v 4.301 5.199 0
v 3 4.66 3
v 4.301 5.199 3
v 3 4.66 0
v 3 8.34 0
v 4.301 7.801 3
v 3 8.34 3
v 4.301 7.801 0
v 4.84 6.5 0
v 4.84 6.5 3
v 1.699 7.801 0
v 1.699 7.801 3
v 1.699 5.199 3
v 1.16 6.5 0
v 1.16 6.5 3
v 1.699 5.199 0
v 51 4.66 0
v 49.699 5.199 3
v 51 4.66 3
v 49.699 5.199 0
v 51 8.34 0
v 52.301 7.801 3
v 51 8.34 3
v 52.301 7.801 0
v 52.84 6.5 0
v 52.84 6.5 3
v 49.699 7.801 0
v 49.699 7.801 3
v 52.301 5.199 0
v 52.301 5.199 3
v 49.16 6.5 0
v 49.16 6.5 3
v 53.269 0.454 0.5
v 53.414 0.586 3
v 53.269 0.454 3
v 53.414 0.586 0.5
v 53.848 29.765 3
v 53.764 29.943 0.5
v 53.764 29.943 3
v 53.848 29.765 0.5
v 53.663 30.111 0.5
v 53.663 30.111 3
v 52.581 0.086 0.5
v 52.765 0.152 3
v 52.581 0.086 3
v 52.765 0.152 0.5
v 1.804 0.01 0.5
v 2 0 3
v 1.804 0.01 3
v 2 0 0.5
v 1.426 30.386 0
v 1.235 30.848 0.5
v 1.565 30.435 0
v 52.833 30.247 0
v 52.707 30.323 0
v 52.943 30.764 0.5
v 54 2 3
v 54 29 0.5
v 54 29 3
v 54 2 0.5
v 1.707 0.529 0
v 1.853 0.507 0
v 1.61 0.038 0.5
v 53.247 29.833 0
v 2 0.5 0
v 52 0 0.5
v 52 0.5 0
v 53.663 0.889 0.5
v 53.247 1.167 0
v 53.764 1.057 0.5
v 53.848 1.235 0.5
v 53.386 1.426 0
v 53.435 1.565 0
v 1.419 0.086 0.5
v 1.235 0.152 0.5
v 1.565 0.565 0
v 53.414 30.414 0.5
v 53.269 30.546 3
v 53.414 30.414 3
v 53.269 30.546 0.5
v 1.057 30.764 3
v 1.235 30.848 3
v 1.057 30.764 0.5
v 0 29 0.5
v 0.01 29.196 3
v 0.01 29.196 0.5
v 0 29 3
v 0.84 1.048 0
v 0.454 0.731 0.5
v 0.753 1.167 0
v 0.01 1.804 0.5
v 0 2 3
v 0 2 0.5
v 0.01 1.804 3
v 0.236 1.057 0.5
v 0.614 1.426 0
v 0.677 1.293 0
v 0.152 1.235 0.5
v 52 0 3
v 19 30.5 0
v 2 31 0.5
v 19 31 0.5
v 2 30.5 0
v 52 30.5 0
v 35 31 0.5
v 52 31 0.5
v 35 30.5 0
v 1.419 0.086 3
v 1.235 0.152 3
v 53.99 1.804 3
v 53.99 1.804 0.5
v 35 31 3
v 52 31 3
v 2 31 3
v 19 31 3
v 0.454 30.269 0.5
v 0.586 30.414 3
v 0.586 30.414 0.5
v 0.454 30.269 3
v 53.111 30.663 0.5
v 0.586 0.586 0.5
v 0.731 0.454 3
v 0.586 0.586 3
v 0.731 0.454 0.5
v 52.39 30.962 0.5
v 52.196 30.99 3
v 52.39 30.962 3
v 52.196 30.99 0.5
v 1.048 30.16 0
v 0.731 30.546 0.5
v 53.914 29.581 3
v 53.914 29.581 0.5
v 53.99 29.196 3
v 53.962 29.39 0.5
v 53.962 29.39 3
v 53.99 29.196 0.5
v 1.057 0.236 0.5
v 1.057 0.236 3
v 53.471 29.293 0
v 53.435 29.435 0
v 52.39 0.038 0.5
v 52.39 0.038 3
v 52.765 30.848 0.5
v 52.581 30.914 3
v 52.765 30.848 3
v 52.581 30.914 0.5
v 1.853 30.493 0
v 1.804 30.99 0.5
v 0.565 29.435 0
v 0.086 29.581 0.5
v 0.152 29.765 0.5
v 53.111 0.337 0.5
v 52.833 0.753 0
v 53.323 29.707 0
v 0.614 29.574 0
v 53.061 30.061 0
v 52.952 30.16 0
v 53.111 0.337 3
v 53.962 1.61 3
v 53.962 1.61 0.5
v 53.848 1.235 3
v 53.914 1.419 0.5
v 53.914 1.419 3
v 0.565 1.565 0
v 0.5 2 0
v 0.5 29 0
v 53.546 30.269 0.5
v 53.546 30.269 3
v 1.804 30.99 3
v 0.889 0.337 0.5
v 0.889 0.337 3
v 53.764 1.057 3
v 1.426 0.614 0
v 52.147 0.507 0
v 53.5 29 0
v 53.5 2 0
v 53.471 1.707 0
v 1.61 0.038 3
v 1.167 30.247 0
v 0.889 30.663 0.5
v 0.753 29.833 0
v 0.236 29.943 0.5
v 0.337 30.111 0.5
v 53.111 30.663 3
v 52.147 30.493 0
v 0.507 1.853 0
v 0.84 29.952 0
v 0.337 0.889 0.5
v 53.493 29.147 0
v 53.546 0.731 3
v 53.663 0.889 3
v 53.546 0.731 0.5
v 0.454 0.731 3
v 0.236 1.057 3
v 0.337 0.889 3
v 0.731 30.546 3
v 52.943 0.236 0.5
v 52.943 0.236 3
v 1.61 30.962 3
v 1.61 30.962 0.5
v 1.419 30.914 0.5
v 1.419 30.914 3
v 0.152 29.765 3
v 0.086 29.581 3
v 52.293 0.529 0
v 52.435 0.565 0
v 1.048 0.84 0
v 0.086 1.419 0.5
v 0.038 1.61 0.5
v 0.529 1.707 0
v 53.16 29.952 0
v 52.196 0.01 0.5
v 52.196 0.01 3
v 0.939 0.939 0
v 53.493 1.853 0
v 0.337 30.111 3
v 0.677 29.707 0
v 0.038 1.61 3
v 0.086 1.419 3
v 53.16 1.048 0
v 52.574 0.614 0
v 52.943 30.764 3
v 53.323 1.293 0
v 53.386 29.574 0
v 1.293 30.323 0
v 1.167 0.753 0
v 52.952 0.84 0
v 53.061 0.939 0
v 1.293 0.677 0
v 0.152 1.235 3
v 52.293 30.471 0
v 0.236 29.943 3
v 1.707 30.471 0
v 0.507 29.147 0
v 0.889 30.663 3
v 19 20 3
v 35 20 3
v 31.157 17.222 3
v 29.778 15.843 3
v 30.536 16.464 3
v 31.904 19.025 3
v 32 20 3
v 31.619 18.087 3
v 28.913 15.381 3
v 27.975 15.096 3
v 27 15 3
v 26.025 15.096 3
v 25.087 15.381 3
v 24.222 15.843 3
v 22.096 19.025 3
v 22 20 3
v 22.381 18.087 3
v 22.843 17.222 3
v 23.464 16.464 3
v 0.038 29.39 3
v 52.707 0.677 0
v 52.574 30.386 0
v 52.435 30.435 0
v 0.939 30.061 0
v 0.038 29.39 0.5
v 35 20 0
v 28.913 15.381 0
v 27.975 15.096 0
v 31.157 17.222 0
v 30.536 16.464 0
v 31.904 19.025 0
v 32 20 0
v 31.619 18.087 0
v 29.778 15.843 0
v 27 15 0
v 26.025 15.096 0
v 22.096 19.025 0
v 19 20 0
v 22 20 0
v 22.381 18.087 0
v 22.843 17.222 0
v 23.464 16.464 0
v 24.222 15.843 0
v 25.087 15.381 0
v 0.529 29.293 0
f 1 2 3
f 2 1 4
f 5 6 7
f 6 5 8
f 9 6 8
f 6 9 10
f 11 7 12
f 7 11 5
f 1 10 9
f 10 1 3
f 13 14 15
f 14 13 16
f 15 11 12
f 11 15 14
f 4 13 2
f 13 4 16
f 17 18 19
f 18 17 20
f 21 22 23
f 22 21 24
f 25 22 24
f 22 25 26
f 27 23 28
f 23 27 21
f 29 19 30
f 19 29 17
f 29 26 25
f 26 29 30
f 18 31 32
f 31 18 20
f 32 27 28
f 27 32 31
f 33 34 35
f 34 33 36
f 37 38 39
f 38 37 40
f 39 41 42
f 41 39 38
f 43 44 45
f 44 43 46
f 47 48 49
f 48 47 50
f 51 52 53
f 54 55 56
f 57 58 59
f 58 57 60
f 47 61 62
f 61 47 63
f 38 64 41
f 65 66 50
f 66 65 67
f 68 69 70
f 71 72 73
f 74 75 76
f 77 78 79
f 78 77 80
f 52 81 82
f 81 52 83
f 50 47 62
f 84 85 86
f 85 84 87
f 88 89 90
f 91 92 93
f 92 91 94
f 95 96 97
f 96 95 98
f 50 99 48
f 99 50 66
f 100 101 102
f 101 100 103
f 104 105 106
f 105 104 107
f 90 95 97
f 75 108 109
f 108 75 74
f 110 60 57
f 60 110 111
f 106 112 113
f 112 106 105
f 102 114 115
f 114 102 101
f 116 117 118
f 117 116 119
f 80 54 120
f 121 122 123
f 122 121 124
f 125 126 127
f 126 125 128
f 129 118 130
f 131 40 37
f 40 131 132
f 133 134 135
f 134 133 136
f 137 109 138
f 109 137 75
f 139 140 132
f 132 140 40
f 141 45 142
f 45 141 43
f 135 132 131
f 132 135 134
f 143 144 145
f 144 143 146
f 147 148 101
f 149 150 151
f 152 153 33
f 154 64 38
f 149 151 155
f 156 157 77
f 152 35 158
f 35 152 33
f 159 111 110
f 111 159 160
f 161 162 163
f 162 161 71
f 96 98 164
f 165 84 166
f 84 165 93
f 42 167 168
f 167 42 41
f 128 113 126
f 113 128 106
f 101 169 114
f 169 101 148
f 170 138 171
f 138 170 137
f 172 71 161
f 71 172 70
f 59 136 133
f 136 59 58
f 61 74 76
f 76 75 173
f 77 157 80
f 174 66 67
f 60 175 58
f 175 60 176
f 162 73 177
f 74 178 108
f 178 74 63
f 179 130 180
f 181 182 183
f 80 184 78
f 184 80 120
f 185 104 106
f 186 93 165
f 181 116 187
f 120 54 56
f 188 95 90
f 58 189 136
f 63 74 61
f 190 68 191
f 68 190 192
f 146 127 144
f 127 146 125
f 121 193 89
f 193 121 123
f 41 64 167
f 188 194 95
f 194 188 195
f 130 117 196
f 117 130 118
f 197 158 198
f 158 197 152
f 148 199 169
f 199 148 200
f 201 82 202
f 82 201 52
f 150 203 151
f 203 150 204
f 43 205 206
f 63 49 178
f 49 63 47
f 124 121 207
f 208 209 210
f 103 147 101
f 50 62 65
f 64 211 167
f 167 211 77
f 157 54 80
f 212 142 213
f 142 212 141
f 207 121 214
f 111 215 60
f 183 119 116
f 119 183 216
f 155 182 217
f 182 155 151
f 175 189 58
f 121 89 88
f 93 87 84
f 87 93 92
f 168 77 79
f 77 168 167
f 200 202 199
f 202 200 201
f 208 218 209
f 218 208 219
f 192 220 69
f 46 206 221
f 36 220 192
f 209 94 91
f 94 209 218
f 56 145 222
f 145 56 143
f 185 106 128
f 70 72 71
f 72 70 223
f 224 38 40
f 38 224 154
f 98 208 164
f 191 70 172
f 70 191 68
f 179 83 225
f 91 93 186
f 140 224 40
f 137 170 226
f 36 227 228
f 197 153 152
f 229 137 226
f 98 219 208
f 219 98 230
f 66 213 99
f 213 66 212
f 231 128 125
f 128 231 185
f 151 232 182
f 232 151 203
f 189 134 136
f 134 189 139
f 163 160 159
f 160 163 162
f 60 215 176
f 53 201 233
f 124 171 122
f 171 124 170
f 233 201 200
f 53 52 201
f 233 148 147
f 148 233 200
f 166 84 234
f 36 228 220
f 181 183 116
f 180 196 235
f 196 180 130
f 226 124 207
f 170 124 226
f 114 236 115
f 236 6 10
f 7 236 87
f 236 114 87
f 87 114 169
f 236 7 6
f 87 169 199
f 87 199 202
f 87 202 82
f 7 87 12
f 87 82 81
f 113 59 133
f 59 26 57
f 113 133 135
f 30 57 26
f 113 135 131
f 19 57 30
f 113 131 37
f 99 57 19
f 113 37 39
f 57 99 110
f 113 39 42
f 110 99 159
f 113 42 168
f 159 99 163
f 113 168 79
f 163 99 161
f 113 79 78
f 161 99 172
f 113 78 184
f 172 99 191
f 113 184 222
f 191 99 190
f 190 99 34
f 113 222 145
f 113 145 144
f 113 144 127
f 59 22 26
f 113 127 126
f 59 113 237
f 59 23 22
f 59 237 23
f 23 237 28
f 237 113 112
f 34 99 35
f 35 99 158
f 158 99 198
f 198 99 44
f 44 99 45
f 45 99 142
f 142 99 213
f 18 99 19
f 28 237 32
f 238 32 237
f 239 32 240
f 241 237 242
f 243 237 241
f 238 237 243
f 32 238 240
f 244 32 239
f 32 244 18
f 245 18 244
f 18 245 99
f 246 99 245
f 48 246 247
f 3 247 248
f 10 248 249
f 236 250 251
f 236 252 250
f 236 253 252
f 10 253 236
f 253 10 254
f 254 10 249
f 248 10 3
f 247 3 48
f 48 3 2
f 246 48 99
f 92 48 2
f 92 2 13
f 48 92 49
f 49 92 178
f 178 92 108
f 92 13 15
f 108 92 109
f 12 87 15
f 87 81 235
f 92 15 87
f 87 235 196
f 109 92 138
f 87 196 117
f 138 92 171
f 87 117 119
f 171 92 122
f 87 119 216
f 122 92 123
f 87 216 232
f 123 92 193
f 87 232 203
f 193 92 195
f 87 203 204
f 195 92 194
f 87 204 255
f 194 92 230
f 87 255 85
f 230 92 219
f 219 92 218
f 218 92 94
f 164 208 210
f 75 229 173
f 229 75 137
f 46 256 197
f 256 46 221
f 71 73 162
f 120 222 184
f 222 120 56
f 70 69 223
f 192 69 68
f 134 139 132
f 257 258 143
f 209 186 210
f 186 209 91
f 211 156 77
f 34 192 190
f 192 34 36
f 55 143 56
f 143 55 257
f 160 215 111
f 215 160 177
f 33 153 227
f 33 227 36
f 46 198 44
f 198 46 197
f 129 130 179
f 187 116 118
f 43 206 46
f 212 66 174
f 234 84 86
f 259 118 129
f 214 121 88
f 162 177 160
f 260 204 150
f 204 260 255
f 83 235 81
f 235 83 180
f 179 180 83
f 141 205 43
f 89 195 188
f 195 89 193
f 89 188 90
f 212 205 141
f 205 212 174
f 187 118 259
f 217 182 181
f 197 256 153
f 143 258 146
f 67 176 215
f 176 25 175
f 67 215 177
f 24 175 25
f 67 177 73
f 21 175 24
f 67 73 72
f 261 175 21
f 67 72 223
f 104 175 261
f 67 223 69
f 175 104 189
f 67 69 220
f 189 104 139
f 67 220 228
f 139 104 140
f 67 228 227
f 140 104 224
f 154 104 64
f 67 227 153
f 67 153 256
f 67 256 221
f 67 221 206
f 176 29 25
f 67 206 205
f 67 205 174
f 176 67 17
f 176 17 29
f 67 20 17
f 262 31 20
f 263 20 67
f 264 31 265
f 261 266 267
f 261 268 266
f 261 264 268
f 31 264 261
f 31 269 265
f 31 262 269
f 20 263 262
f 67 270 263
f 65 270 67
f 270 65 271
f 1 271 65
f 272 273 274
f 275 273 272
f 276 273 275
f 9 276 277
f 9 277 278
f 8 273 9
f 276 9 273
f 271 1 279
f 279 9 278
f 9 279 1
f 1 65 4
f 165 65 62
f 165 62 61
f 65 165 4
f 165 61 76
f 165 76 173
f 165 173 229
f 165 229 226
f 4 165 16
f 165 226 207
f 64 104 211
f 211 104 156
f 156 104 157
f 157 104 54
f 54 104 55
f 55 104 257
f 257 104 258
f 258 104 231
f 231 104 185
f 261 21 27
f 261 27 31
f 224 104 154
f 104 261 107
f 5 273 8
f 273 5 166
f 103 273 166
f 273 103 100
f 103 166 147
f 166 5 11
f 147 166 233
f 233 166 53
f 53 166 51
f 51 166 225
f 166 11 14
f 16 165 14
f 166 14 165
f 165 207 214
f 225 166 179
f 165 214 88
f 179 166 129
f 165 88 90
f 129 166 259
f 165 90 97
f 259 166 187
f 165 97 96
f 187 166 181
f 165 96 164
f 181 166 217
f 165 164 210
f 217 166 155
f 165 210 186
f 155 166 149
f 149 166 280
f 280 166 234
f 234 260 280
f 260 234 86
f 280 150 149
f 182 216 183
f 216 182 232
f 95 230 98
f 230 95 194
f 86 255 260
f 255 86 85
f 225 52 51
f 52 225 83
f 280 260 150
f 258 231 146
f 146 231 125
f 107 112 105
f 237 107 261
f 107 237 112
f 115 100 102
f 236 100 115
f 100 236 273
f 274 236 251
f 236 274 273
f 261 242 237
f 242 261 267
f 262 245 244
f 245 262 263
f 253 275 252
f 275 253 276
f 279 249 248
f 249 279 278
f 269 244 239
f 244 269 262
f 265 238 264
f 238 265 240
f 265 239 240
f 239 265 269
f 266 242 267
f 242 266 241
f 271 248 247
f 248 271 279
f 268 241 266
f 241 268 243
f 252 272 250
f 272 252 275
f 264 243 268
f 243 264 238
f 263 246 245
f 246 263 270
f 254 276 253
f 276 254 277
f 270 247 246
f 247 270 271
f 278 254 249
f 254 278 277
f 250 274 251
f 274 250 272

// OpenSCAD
// =====================================================================
// child_vtray_batt_gate.scad — LiPo bay axial quick-release gate
// Print flat. Two accessible M3 screws release the battery along +Z while
// C-MAIN and the battery box remain installed.
// =====================================================================

include <../../../../../scad/lib/util.scad>;

gate_w = 54;
gate_h = 31;
gate_t = 3;
boss_x = 24;
boss_y = 6.5;
screw_d = 3.4;
wire_notch_w = 16;
wire_notch_h = 11;
finger_r = 5;

$fa=4;
$fs=0.3;

assert(boss_x+screw_d/2 < gate_w/2-0.5,"gate screw too close to edge");

difference() {
    box_rounded(gate_w,gate_h,gate_t,r=2,chamfer=0.5);
    for (sx=[-1,1])
        translate([gate_w/2+sx*boss_x,boss_y,-0.1])
            hole(screw_d,gate_t+0.2,fn=8);
    translate([(gate_w-wire_notch_w)/2,gate_h-wire_notch_h,-0.1])
        cube([wire_notch_w,wire_notch_h+0.2,gate_t+0.2]);
    translate([gate_w/2,gate_h-wire_notch_h,-0.1])
        cylinder(r=finger_r,h=gate_t+0.2,$fn=32);
}
